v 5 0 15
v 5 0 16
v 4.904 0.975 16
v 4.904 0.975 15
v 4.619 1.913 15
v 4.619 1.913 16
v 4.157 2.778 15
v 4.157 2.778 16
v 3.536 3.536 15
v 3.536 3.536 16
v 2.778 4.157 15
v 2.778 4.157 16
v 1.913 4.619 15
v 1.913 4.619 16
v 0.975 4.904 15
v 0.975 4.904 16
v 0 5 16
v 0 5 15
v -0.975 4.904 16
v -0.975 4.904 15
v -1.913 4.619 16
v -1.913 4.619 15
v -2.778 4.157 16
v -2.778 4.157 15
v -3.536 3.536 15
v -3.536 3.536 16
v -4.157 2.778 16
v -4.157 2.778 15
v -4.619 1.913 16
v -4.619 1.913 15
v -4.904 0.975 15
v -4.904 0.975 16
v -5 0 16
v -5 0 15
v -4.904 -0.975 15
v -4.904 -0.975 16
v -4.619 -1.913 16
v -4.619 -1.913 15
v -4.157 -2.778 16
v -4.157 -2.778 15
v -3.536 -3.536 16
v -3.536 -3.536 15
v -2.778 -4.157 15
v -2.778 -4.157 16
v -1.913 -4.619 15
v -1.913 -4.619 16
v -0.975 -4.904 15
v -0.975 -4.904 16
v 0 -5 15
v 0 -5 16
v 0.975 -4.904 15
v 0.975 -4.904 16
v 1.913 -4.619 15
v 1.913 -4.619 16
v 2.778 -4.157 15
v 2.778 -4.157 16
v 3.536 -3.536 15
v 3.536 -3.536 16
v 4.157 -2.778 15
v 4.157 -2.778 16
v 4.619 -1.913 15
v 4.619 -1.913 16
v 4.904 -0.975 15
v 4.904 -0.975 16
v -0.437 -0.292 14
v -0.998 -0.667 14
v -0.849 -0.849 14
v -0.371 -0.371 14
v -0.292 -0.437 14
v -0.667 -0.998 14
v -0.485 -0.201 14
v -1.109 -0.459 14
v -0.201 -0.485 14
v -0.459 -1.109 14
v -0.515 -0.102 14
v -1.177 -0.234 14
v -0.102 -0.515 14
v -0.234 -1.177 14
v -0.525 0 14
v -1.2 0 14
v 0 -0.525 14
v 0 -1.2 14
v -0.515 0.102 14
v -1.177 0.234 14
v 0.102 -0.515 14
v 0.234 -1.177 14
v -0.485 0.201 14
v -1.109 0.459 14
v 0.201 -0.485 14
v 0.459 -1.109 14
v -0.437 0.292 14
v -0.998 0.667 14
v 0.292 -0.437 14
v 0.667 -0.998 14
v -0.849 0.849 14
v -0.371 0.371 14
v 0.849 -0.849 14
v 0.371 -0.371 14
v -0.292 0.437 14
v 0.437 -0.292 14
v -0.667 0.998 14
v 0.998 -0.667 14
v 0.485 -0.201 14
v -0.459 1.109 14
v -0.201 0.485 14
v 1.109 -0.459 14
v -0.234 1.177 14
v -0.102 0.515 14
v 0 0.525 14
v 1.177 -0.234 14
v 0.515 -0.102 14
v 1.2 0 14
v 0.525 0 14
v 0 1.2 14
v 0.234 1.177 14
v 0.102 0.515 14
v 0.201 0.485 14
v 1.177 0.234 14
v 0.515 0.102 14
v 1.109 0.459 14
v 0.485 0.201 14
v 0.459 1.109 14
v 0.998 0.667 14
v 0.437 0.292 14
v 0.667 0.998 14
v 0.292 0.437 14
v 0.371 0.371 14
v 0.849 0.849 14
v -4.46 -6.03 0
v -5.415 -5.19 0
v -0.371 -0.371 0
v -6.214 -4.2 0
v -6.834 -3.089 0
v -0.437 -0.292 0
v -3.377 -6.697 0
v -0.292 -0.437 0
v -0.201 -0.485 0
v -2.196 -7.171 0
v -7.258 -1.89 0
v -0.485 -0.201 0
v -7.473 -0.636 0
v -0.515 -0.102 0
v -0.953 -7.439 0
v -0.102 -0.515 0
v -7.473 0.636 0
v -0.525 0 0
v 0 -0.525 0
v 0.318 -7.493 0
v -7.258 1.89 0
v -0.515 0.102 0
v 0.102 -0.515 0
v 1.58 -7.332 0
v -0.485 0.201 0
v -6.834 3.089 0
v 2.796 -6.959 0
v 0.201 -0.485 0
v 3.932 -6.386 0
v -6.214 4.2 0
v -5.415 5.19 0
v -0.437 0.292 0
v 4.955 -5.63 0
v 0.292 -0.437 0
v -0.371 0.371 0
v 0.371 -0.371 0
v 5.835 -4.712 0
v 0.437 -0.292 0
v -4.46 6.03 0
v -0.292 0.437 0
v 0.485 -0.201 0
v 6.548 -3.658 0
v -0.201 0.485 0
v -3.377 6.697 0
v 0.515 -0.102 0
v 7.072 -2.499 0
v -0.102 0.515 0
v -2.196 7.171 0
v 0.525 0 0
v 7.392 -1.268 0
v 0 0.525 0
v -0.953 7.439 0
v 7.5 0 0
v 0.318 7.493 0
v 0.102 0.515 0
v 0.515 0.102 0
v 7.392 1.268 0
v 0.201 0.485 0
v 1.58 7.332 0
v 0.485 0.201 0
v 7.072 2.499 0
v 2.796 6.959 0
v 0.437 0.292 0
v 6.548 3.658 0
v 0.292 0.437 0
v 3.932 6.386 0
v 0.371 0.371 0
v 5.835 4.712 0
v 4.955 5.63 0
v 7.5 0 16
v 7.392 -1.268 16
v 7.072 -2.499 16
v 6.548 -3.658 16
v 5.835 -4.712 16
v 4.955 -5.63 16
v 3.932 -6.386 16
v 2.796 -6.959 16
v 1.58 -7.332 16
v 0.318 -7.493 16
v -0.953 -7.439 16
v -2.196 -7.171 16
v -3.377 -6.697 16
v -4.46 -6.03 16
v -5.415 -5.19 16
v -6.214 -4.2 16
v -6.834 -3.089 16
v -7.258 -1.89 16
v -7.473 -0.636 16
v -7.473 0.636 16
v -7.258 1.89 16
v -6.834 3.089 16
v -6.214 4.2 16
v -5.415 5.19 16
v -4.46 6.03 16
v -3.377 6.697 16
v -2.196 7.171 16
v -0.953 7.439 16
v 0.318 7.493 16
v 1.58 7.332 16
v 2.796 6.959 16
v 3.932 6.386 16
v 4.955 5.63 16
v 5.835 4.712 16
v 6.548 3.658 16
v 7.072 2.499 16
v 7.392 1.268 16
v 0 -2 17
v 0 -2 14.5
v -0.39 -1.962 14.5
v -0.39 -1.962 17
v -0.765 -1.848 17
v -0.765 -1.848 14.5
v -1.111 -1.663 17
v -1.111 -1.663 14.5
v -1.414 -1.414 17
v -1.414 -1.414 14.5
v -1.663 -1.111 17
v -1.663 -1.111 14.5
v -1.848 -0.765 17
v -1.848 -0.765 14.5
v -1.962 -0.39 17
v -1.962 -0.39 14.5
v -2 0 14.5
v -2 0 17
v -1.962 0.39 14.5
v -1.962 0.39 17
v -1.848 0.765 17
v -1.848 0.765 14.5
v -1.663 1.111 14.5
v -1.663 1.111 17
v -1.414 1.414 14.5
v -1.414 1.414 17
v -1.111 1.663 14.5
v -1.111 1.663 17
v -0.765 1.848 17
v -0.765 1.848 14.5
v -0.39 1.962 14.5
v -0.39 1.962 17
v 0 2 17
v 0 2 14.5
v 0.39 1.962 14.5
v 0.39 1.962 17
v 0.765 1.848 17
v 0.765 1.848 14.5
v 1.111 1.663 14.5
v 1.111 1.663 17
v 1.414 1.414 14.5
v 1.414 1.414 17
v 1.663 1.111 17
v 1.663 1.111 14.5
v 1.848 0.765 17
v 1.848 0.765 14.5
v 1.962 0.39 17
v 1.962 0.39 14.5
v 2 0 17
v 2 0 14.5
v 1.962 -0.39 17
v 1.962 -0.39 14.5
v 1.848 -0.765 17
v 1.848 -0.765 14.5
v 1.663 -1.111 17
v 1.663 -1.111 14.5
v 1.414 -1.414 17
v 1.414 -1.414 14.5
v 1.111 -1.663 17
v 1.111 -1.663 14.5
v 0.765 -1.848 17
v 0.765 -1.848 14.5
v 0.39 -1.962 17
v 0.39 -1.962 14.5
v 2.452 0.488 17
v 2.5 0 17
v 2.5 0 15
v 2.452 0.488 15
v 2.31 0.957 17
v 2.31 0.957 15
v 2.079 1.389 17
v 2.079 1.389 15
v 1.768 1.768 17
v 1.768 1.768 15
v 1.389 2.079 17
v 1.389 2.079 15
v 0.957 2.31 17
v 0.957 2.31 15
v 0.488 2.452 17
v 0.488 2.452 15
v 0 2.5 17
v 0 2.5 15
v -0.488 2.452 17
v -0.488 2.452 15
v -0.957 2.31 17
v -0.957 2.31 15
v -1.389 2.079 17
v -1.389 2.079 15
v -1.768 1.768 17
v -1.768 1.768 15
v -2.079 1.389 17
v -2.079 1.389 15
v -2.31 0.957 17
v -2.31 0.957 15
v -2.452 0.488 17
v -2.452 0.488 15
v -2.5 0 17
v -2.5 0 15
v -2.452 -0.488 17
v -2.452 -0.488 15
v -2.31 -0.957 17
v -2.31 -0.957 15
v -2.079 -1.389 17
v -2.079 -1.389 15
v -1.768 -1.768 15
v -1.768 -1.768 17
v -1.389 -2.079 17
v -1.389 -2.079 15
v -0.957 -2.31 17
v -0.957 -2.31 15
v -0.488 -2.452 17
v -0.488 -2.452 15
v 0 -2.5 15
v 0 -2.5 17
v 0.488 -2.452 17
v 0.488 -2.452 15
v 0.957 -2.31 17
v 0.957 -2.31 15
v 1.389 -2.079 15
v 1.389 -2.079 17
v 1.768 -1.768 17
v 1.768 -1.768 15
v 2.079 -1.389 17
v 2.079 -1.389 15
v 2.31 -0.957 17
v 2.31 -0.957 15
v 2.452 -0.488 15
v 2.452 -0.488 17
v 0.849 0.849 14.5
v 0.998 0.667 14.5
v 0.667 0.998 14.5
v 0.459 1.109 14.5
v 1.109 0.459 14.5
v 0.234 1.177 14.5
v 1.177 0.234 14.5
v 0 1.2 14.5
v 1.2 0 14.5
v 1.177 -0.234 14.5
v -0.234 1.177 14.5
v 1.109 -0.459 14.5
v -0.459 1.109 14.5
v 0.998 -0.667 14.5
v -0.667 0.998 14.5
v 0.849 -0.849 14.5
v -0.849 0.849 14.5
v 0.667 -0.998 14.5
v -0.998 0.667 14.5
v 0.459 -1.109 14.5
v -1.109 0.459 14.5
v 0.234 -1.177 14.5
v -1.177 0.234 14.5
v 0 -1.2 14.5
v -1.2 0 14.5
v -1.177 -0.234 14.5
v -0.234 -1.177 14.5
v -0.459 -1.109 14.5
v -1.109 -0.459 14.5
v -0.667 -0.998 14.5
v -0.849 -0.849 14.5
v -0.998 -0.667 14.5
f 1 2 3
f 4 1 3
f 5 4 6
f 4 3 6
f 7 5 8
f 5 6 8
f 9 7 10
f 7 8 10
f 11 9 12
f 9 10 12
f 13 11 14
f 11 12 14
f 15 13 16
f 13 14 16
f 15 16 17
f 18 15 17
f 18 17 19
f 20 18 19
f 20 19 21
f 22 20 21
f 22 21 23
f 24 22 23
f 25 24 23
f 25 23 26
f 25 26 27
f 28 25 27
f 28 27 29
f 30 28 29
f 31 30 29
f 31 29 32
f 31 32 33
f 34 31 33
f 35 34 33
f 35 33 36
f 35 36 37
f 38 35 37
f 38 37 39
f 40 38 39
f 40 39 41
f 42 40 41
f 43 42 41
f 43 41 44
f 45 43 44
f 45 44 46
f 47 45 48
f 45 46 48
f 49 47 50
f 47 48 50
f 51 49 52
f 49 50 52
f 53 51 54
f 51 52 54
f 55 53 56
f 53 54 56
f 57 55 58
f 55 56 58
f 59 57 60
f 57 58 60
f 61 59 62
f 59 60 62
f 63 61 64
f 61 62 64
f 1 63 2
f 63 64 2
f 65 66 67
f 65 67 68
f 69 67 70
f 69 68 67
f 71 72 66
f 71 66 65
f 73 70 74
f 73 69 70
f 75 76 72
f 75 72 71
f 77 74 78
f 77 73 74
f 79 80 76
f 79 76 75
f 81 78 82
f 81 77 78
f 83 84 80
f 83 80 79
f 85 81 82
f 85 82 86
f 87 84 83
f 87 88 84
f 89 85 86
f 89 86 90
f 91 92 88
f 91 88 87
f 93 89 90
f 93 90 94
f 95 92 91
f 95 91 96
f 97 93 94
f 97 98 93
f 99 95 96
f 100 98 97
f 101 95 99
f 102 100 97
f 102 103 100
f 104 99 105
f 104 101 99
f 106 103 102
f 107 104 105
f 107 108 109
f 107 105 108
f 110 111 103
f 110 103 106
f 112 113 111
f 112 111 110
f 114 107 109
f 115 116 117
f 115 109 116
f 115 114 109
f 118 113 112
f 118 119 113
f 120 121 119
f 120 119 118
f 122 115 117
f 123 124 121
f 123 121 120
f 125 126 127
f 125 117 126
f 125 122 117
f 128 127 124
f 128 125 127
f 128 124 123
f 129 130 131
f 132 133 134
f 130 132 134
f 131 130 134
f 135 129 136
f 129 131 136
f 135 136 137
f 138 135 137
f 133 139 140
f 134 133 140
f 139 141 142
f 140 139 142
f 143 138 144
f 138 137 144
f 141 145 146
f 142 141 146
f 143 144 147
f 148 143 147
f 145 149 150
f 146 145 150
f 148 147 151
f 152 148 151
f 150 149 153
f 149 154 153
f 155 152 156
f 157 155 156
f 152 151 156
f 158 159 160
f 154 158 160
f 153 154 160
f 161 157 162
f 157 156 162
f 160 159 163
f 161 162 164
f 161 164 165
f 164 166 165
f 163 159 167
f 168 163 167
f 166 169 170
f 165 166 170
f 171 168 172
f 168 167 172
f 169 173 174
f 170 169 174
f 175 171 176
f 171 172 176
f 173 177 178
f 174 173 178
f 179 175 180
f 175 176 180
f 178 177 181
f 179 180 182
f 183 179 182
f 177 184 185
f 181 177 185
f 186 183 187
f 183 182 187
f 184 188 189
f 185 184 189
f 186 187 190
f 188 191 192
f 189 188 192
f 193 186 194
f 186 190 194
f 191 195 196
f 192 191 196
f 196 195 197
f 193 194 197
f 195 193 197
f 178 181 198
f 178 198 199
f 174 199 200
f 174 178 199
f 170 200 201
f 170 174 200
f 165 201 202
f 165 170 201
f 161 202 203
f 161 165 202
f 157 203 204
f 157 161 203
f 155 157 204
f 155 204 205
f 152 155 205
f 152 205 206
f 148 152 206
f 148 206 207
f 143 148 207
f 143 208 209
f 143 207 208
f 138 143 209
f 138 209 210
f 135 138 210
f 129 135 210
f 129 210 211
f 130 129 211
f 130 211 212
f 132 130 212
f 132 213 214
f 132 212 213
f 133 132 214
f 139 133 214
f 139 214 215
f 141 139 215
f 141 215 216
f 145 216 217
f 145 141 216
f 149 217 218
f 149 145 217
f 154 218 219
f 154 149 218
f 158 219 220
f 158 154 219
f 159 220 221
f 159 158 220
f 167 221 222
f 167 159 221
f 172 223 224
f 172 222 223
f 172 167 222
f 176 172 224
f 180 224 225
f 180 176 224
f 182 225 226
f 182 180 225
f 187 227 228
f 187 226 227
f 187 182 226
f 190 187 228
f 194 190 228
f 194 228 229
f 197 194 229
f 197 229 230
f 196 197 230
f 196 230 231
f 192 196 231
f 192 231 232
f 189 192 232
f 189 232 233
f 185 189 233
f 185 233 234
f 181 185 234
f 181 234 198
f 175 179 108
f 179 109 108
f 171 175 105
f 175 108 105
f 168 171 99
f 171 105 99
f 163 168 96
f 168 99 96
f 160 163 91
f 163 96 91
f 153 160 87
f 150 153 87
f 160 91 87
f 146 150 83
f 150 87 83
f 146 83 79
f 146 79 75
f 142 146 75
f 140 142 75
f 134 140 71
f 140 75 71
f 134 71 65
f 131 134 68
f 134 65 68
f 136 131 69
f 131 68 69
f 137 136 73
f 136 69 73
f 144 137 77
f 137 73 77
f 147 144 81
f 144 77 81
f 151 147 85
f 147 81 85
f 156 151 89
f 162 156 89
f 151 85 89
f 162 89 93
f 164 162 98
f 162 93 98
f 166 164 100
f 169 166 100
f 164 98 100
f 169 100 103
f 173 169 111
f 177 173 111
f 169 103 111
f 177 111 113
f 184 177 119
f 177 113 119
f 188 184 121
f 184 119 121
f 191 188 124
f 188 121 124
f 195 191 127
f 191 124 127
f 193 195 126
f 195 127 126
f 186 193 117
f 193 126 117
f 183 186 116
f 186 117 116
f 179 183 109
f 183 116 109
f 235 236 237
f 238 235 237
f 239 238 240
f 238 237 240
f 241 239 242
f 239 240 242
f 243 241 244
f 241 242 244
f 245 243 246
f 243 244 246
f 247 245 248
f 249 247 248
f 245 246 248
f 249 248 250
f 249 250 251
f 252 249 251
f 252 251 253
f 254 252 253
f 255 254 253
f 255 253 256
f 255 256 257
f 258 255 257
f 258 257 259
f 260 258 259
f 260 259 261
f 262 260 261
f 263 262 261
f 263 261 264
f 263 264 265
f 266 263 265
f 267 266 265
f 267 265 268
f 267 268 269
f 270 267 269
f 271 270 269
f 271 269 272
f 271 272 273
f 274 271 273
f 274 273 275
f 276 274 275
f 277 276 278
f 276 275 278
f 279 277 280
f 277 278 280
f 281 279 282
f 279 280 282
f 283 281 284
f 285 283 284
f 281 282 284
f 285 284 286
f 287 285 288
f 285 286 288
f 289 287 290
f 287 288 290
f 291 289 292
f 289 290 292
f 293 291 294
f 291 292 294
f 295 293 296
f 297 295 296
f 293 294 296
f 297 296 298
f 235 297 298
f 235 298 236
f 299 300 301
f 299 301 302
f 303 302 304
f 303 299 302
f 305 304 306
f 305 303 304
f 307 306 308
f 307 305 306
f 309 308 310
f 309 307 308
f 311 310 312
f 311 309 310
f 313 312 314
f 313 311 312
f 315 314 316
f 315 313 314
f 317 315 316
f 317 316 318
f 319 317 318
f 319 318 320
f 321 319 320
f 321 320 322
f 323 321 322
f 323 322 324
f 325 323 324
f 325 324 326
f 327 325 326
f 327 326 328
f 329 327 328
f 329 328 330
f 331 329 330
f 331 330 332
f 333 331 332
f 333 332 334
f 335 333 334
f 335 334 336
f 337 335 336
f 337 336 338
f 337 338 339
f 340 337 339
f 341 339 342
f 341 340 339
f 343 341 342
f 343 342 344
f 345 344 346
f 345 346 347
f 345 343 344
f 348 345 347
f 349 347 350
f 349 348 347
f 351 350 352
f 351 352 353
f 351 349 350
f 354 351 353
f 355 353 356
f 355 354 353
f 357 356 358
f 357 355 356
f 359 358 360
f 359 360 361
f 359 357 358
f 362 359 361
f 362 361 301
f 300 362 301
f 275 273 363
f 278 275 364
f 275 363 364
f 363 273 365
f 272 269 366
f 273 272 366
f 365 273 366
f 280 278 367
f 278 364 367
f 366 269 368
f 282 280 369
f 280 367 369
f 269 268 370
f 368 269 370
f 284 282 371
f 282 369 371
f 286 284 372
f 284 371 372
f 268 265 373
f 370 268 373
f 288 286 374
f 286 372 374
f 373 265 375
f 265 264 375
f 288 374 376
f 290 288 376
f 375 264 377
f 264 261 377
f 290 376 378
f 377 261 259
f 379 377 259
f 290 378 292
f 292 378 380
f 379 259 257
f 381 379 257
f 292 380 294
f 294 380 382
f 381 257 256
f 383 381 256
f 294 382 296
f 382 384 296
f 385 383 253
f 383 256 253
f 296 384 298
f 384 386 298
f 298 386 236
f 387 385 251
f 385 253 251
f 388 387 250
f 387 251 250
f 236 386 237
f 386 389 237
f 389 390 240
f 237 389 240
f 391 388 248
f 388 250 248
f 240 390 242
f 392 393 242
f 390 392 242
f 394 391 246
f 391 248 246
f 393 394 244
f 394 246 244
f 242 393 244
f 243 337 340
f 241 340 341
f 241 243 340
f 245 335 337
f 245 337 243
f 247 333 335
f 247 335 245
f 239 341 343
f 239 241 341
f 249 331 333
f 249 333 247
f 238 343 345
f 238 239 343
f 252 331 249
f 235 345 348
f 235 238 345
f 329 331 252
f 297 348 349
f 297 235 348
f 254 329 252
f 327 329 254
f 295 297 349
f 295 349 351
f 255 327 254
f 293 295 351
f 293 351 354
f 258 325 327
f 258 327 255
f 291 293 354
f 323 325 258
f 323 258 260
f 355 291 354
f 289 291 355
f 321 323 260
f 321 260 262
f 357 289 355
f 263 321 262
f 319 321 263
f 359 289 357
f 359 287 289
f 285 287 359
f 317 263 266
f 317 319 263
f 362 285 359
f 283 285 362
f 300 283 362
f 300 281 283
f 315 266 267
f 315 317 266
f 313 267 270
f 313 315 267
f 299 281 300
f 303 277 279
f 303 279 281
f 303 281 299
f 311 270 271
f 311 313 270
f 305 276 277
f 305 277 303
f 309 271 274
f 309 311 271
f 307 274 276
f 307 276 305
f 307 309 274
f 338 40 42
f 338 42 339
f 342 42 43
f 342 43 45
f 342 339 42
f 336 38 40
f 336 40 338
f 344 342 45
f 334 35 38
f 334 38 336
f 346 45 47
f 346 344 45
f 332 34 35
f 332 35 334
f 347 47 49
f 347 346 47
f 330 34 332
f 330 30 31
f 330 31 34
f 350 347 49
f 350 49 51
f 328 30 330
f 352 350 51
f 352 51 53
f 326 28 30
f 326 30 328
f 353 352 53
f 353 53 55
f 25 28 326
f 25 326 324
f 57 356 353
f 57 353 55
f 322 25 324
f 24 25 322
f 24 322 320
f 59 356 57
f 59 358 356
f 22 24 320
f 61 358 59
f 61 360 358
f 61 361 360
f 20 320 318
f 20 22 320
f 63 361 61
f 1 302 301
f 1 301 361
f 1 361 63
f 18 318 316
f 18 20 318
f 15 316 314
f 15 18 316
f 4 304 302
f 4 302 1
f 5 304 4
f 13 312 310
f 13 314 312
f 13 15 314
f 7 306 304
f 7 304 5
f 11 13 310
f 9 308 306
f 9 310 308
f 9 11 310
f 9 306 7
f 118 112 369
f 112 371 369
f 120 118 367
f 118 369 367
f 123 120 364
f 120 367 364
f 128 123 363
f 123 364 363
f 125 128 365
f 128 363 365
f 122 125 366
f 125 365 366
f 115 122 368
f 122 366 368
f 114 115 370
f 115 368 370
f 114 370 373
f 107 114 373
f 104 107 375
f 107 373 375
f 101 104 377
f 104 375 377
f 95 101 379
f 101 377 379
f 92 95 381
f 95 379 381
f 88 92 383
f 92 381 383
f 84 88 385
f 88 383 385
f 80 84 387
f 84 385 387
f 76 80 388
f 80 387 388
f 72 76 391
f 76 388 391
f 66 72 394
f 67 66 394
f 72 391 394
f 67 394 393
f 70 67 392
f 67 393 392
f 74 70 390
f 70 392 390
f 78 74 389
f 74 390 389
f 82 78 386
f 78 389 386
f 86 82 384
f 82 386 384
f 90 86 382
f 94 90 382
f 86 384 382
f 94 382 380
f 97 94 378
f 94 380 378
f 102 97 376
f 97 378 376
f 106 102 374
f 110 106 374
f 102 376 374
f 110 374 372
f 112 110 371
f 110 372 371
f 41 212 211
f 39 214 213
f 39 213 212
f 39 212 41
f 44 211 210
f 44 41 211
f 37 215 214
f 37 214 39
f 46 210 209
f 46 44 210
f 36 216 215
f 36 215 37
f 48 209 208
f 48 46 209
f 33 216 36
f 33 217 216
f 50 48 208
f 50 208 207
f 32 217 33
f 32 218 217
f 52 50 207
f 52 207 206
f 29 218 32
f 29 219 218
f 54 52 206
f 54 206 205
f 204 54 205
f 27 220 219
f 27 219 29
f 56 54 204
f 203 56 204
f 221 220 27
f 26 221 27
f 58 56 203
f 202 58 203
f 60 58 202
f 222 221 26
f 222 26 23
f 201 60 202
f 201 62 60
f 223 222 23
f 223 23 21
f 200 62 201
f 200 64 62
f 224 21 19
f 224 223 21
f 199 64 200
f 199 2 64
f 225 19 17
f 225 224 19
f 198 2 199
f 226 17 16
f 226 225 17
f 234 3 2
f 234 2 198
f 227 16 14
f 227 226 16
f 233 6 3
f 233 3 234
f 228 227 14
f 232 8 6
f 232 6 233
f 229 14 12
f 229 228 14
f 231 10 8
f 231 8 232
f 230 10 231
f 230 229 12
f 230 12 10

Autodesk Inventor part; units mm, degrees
ref_plane "YZ Plane" through (0, 0, 0) normal (1, 0, 0) x (0, 1, 0)
ref_plane "XZ Plane" through (0, 0, 0) normal (0, 1, 0) x (-1, 0, 0)
ref_plane "XY Plane" through (0, 0, 0) normal (0, 0, 1) x (1, 0, 0)
sketch "Sketch1" plane through (0, 0, 0) normal (0, 0, 1) x (1, 0, 0)
  circle A0 centre (0, 0) radius 7.5
  dimension "d0" = 15
extrude "Extrusion1" add sketch "Sketch1" along normal blind 16
sketch "Sketch2" plane through (0, 0, 16) normal (0, 0, 1) x (1, 0, 0)
  circle A0 centre (0, 0) radius 7.5 projected
  circle A1 centre (0, 0) radius 1.2
  dimension "d3" = 2.4
extrude "Extrusion2" cut sketch "Sketch2" against normal blind 2 contours A1
sketch "Sketch3" plane through (0, 0, 16) normal (0, 0, 1) x (1, 0, 0)
  circle A0 centre (0, 0) radius 7.5 projected
  circle A1 centre (0, 0) radius 1.9
  circle A2 centre (0, 0) radius 2.5
  dimension "d6" = 3.8
  dimension "d7" = 5
extrude "Extrusion3" add sketch "Sketch3" along normal blind 1 contours A2
sketch "Sketch4" plane through (0, 0, 16) normal (0, 0, 1) x (1, 0, 0)
  circle A0 centre (0, 0) radius 2.5 projected
  circle A1 centre (0, 0) radius 5
  dimension "d10" = 10
extrude "Extrusion4" cut sketch "Sketch4" against normal blind 1
sketch "Sketch5" plane through (0, 0, 0) normal (0, 0, -1) x (-1, 0, 0)
  circle A0 centre (0, 0) radius 7.5 projected
hole "Hole1" at (0, 0, 0) direction (0, 0, 1) diameter 1.05 end through all
sketch "Sketch6" plane through (0, 0, 17) normal (0, 0, 1) x (1, 0, 0)
  circle A0 centre (0, 0) radius 1.9 projected
hole "Hole2" at (0, 0, 17) direction (0, 0, -1) diameter 4 depth 2.5
properties part number "Bearing_ID_Asm_Base"
